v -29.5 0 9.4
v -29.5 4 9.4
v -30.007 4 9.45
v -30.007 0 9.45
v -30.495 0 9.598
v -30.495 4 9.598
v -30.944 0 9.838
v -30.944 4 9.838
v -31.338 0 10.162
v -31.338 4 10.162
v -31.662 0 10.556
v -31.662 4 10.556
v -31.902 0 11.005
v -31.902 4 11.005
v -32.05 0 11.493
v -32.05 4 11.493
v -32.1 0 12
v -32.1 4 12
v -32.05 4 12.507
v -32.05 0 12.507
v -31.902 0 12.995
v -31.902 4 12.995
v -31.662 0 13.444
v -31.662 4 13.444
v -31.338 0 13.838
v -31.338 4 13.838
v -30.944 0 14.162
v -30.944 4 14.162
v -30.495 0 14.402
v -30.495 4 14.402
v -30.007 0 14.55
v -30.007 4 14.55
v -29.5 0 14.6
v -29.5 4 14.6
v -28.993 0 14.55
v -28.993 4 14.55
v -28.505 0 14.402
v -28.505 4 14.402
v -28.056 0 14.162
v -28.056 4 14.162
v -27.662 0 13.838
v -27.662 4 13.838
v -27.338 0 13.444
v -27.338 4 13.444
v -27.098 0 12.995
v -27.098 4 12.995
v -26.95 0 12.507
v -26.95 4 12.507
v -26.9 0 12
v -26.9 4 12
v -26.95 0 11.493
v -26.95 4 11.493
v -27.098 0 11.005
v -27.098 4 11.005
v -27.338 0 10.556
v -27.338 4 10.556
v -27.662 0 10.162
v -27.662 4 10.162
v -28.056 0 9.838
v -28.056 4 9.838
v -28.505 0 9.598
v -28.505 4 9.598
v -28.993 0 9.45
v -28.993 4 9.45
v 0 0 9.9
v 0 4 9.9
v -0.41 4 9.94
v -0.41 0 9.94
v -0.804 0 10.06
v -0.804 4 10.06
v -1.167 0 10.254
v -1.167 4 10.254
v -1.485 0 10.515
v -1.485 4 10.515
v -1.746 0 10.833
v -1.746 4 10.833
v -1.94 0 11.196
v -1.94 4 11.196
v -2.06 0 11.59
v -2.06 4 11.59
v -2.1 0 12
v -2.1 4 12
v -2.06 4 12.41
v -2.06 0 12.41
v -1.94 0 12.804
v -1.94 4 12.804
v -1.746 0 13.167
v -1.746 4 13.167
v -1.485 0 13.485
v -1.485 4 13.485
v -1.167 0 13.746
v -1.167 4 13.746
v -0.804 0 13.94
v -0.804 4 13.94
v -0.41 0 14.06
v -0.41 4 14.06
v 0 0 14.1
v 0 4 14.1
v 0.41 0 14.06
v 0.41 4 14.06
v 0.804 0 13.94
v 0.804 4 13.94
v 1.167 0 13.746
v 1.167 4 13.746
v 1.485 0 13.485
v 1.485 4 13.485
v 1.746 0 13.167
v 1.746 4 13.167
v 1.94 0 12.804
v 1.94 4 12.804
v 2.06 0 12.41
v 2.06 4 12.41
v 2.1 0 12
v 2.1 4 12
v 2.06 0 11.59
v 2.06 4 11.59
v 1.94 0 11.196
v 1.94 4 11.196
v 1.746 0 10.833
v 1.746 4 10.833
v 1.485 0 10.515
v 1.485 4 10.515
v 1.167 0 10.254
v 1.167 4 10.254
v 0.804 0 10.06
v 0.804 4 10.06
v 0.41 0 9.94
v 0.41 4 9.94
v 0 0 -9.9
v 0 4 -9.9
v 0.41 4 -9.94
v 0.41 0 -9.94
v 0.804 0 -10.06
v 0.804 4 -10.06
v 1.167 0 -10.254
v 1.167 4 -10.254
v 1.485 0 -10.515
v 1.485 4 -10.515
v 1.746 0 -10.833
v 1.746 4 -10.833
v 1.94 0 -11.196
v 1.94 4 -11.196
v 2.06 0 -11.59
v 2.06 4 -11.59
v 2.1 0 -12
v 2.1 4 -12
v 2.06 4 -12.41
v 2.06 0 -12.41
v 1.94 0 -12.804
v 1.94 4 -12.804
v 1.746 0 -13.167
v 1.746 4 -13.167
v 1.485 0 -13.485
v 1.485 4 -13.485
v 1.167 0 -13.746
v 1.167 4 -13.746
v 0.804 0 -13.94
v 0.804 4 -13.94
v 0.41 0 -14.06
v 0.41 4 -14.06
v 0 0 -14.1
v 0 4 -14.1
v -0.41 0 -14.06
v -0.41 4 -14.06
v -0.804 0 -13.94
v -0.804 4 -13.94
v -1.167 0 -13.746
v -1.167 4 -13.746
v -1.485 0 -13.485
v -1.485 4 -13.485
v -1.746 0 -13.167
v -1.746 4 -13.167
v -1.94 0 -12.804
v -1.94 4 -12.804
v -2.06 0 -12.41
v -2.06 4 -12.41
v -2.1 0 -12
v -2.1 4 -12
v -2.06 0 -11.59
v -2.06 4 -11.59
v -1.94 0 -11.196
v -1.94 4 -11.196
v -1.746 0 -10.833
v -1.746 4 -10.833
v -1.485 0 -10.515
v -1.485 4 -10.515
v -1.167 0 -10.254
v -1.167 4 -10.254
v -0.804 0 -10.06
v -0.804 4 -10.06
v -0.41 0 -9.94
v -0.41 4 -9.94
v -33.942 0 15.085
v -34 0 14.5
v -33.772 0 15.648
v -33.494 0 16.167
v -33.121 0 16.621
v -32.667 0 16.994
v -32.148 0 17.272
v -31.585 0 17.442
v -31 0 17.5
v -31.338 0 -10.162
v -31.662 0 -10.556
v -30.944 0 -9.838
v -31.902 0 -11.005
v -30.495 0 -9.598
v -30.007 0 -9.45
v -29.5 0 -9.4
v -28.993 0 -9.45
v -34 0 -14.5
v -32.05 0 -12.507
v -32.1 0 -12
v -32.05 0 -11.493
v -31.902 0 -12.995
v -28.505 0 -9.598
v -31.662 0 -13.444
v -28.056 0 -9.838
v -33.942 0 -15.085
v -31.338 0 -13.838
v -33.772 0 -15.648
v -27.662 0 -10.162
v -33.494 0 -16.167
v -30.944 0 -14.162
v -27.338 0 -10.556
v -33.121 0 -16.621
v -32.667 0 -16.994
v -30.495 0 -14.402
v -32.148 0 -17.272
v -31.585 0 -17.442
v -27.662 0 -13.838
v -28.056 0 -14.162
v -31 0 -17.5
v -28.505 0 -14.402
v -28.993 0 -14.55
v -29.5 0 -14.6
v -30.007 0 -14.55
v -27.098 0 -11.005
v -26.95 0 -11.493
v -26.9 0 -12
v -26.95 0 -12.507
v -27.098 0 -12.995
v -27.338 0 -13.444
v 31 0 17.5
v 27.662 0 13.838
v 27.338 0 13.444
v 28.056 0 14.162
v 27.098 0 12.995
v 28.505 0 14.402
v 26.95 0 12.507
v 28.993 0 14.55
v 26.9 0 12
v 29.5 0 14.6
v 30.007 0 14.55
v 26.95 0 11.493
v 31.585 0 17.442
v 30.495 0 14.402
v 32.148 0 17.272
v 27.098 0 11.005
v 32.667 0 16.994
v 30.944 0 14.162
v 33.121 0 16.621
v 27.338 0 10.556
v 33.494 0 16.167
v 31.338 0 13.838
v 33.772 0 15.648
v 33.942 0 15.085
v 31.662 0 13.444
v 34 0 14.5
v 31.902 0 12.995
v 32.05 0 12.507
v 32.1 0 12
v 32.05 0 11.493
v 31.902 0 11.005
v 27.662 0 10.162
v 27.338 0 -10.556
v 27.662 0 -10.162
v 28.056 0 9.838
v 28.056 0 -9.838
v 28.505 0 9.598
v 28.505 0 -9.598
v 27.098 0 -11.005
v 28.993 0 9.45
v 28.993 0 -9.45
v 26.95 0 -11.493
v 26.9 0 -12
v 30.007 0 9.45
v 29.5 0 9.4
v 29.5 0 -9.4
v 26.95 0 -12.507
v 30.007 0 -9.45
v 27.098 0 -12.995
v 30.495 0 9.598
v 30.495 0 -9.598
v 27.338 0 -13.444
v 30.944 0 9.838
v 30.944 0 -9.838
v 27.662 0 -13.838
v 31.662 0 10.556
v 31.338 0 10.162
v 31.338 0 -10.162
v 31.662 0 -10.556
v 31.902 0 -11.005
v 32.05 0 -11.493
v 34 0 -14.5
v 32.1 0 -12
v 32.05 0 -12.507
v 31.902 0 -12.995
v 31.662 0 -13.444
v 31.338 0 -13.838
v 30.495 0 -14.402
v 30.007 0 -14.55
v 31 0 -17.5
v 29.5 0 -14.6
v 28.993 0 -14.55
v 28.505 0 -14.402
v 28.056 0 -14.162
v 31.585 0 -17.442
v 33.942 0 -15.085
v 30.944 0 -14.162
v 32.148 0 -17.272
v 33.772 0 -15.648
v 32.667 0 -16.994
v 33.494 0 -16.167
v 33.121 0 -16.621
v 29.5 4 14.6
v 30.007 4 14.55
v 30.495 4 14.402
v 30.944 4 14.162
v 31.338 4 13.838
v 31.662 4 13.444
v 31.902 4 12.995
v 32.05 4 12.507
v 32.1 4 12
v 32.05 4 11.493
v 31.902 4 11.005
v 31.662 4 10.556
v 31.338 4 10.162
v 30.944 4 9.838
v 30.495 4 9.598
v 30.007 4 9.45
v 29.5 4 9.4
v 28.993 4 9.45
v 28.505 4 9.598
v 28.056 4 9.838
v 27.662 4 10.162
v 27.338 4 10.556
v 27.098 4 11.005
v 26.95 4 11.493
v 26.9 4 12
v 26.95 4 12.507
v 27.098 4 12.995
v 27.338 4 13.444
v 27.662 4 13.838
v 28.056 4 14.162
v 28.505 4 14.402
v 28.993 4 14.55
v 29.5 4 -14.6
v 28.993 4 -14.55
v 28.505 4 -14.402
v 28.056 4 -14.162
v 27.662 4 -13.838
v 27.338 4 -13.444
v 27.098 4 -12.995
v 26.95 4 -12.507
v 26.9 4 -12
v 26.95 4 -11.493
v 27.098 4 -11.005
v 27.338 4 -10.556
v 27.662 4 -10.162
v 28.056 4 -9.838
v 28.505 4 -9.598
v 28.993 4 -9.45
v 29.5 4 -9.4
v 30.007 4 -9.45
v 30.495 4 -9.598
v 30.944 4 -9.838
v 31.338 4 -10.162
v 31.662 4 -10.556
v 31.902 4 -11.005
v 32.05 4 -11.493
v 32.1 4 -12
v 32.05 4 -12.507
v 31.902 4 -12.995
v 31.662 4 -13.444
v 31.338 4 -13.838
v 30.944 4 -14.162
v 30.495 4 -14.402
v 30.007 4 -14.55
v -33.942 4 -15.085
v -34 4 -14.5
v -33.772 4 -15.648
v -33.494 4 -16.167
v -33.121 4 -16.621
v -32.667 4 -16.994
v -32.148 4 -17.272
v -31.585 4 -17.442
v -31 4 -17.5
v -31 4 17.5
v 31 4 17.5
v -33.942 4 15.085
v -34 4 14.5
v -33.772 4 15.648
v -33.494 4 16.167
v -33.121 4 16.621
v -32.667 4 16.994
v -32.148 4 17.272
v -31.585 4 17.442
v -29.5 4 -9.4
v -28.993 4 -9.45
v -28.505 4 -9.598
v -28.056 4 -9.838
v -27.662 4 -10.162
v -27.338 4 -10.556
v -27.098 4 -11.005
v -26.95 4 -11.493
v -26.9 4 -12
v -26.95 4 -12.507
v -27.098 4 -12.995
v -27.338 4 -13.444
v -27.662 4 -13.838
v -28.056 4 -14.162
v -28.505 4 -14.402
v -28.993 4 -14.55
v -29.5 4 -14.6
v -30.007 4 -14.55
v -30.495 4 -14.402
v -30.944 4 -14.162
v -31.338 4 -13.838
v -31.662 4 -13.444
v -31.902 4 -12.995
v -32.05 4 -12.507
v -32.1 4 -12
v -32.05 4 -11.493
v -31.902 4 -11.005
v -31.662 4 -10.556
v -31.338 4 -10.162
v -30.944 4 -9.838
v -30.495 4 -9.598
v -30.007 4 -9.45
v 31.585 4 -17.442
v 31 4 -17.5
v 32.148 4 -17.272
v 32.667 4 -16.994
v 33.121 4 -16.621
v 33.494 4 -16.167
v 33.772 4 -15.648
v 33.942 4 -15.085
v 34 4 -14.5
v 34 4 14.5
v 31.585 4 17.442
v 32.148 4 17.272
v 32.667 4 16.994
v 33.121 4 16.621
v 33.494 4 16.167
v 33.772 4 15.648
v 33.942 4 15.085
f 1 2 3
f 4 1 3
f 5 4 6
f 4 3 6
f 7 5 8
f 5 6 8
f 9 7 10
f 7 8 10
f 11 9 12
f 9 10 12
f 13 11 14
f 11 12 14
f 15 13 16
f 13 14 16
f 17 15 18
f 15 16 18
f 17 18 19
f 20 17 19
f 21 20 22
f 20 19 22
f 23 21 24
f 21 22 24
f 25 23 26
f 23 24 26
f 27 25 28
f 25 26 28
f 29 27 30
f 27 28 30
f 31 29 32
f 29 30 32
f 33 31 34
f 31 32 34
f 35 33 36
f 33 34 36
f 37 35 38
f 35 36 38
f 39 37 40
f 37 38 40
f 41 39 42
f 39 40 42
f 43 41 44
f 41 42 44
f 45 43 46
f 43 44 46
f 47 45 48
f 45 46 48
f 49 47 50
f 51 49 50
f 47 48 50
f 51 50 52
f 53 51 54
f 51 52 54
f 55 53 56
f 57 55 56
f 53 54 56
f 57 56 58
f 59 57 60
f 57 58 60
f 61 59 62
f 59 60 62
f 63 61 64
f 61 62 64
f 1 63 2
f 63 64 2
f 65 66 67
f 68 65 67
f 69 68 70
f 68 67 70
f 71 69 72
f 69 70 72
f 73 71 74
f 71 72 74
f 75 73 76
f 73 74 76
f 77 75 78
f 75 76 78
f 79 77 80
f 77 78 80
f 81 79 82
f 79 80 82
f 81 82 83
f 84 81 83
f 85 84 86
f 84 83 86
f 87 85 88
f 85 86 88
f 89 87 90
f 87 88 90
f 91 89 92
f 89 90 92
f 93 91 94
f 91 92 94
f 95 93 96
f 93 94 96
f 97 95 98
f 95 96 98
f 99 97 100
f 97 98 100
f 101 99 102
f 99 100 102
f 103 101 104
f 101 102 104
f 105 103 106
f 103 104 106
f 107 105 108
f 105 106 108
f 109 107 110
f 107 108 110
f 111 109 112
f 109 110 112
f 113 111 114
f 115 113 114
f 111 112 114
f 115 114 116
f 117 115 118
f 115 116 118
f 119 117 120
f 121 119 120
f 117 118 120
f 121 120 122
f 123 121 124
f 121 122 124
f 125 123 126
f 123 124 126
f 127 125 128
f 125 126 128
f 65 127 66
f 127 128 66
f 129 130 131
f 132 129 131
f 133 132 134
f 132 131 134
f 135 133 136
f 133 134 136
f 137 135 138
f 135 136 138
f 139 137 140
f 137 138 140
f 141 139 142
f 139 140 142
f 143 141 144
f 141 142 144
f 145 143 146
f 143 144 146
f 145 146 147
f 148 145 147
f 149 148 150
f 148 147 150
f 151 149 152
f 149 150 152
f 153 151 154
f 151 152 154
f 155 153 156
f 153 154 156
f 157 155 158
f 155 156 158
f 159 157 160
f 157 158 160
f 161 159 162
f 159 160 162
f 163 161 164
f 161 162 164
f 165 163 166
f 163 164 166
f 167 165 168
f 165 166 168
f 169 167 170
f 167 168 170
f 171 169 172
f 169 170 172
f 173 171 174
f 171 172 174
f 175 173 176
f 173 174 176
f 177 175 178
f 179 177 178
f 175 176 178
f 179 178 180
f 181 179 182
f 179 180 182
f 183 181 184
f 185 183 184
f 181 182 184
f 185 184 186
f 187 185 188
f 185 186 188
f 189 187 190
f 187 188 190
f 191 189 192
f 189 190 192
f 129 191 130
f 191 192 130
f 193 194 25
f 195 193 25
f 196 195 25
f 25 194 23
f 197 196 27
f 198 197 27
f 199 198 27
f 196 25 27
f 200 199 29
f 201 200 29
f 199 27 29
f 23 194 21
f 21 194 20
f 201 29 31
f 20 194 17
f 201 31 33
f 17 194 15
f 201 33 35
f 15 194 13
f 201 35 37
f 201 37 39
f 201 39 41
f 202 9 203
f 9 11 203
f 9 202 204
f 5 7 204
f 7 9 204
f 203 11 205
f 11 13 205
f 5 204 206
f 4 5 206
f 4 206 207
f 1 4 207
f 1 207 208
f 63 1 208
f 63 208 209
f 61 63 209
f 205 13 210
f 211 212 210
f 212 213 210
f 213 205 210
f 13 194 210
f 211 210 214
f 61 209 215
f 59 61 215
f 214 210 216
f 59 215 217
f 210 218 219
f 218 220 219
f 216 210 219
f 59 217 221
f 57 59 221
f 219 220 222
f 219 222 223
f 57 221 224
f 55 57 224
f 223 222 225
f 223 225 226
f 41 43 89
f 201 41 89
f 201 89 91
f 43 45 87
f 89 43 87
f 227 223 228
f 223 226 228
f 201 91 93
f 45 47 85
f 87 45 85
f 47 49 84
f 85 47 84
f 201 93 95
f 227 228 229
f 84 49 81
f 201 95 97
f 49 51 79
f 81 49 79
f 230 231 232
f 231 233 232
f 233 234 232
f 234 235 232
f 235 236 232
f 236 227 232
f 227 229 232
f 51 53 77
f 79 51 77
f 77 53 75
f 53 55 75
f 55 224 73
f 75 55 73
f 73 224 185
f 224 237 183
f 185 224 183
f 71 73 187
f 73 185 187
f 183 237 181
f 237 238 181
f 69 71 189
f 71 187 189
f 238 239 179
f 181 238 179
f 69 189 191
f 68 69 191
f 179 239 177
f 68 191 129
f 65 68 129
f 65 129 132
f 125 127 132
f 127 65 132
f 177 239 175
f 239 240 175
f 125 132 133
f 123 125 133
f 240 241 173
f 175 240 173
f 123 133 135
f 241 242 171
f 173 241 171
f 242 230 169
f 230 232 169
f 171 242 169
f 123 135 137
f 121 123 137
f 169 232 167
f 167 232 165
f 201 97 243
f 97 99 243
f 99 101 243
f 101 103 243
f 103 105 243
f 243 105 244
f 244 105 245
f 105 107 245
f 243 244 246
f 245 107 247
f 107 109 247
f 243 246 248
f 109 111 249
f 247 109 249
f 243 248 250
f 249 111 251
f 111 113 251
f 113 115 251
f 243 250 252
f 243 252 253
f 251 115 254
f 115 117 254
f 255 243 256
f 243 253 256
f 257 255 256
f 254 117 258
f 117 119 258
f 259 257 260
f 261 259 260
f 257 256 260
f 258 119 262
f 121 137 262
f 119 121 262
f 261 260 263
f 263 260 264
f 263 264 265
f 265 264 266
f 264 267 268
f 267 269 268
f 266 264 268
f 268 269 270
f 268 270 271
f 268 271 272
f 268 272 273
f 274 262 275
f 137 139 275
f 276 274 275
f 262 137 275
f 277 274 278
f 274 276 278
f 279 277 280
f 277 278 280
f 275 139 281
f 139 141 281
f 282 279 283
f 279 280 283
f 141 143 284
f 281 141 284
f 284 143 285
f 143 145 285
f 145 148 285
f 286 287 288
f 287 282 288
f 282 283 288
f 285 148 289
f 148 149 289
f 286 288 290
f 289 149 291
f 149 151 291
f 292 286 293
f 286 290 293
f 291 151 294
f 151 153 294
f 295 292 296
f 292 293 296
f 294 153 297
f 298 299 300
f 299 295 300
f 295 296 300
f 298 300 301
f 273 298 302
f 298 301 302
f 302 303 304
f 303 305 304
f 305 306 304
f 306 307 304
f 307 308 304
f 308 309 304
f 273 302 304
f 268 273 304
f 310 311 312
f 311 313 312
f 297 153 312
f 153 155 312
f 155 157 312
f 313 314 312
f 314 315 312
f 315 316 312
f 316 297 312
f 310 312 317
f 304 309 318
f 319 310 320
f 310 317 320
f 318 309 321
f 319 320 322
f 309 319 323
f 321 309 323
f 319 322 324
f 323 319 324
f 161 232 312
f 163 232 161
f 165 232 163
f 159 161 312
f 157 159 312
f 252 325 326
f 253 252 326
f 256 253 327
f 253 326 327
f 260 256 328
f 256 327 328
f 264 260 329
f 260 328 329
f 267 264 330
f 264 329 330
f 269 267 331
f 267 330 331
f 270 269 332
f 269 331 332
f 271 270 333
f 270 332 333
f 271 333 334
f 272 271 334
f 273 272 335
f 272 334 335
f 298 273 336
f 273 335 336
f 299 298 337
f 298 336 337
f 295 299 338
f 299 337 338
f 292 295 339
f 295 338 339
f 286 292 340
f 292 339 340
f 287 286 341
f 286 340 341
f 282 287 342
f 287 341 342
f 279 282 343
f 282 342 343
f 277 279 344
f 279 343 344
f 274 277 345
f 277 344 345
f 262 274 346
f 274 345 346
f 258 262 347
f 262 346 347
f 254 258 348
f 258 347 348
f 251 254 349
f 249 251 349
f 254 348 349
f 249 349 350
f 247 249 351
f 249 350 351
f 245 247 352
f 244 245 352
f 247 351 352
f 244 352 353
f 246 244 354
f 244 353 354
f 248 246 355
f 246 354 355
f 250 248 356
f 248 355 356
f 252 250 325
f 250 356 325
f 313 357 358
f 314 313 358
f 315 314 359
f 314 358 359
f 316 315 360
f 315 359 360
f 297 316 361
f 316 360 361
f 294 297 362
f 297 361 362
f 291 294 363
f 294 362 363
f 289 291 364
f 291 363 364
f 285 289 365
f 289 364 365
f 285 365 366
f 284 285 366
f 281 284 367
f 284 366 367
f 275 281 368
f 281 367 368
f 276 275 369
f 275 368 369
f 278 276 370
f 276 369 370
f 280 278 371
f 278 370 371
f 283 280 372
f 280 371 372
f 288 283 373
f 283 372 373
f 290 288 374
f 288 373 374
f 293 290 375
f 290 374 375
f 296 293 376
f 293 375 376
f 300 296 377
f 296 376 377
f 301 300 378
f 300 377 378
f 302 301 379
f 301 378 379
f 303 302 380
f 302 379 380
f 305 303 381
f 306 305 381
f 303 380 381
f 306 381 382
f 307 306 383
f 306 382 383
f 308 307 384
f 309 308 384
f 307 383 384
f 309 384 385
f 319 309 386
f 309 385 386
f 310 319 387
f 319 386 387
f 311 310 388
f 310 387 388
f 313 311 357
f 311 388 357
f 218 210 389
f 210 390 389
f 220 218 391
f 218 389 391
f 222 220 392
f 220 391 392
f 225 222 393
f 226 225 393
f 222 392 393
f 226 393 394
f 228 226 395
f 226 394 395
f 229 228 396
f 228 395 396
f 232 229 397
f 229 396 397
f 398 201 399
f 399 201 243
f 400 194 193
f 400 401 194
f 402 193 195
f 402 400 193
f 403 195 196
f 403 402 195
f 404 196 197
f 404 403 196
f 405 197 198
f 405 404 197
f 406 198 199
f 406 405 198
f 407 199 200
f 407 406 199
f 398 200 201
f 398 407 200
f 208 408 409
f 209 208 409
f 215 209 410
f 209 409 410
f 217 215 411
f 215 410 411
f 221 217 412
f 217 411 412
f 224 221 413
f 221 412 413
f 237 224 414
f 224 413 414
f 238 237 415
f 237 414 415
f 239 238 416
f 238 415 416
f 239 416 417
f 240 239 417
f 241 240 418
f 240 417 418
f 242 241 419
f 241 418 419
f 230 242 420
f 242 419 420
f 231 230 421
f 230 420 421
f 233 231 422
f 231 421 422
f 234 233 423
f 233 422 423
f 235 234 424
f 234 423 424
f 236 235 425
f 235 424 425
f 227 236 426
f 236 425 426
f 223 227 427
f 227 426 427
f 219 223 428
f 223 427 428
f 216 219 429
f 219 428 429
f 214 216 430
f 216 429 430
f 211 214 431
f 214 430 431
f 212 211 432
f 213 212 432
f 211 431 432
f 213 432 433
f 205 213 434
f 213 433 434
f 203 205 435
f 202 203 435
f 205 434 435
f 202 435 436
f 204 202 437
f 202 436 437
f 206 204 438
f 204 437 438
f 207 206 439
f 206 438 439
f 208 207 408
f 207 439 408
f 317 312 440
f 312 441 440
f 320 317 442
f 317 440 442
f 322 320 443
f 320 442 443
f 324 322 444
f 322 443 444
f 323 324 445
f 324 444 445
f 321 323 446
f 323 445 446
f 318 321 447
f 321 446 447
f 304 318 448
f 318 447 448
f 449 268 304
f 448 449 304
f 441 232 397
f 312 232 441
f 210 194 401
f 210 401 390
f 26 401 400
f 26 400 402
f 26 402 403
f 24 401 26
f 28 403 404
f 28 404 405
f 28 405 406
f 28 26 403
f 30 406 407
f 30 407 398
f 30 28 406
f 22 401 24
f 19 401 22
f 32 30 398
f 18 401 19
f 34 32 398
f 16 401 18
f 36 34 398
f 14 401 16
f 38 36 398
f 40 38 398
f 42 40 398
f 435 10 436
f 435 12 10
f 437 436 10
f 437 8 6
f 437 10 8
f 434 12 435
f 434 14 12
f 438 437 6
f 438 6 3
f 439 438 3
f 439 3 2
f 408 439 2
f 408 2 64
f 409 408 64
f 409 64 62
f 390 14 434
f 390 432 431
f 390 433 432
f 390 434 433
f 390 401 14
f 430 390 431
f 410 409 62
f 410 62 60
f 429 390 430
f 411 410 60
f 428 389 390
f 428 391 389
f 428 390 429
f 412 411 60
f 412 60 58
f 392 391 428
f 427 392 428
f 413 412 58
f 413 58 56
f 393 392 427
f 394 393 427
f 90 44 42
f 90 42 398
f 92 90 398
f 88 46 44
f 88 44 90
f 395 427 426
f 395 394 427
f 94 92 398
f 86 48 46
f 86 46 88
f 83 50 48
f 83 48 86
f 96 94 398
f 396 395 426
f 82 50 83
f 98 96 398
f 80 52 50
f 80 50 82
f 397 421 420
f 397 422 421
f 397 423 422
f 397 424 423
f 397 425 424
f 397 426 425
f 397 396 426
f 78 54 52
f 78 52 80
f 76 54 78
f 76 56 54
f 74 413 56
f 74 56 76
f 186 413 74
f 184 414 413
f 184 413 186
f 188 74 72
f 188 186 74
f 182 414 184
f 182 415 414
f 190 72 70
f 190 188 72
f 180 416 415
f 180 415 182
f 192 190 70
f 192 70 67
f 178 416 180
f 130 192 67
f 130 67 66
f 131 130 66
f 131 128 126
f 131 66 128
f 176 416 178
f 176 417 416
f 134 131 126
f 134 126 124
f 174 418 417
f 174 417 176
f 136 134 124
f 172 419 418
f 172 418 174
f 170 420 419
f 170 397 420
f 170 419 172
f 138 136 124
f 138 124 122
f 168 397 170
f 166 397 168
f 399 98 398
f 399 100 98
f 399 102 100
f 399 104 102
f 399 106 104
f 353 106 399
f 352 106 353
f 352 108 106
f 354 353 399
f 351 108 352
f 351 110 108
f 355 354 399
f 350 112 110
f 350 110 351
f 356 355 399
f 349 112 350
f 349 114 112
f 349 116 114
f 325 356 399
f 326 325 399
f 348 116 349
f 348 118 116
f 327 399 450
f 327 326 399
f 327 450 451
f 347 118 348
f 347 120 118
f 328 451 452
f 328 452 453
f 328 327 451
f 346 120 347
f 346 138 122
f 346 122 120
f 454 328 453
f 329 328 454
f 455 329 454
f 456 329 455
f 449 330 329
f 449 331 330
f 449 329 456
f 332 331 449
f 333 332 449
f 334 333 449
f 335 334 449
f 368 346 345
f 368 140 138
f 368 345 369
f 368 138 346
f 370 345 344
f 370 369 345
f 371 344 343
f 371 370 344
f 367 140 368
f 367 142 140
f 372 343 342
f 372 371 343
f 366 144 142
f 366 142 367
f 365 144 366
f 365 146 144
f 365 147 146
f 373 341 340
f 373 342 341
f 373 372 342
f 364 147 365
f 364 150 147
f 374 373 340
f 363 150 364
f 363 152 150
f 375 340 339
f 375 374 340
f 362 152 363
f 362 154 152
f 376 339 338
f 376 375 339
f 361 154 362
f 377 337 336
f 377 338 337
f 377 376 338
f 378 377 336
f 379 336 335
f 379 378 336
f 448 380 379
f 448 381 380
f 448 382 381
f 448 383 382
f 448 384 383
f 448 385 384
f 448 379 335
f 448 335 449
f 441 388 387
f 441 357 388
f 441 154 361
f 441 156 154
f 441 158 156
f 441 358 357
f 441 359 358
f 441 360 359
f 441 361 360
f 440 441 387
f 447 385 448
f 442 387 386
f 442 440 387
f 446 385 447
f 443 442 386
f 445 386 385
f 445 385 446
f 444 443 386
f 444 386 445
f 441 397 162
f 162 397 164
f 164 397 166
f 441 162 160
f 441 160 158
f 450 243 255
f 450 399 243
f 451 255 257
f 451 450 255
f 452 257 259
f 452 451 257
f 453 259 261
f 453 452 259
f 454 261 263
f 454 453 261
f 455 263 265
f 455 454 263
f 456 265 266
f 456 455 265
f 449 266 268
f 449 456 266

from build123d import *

# Parameters (mm, degrees)
SKETCH_1_W          = 68
SKETCH_1_H          = 35
EXTRUDE_1_DEPTH     = 4
SKETCH_2_R          = 2.6
SKETCH_2_R_2        = 2.1
CUT_EXTRUDE_1_DEPTH = 4
FILLET_1_R          = 3


with BuildPart() as part:
    # 草图1 → 凸台-拉伸1 (new body)
    with BuildSketch(Plane(origin=(0, 0, 0), x_dir=(1, 0, 0), z_dir=(0, 1, 0))):
        Rectangle(SKETCH_1_W, SKETCH_1_H)
    extrude(amount=EXTRUDE_1_DEPTH)

    # 草图2 → 切除-拉伸1 (cut)
    with BuildSketch(Plane(origin=(0, 4, 0), x_dir=(1, 0, 0), z_dir=(0, 1, 0))):
        with Locations(Location((-29.5, 12, 0), (0, 0, 270))):
            Circle(SKETCH_2_R)
        with Locations(Location((29.5, 12, 0), (0, 0, 90))):
            Circle(SKETCH_2_R)
        with Locations(Location((29.5, -12, 0), (0, 0, 270))):
            Circle(SKETCH_2_R)
        with Locations(Location((-29.5, -12, 0), (0, 0, 90))):
            Circle(SKETCH_2_R)
        with Locations(Location((0, 12, 0), (0, 0, 270))):
            Circle(SKETCH_2_R_2)
        with Locations(Location((0, -12, 0), (0, 0, 90))):
            Circle(SKETCH_2_R_2)
    extrude(amount=-CUT_EXTRUDE_1_DEPTH, mode=Mode.SUBTRACT)

    # 圆角1
    fillet_1_edges = [part.edges().sort_by_distance(p)[0] for p in [
        (34, 2, 17.5),
        (-34, 2, 17.5),
        (-34, 2, -17.5),
        (34, 2, -17.5),
    ]]
    fillet(fillet_1_edges, radius=FILLET_1_R)


solid = part.part
